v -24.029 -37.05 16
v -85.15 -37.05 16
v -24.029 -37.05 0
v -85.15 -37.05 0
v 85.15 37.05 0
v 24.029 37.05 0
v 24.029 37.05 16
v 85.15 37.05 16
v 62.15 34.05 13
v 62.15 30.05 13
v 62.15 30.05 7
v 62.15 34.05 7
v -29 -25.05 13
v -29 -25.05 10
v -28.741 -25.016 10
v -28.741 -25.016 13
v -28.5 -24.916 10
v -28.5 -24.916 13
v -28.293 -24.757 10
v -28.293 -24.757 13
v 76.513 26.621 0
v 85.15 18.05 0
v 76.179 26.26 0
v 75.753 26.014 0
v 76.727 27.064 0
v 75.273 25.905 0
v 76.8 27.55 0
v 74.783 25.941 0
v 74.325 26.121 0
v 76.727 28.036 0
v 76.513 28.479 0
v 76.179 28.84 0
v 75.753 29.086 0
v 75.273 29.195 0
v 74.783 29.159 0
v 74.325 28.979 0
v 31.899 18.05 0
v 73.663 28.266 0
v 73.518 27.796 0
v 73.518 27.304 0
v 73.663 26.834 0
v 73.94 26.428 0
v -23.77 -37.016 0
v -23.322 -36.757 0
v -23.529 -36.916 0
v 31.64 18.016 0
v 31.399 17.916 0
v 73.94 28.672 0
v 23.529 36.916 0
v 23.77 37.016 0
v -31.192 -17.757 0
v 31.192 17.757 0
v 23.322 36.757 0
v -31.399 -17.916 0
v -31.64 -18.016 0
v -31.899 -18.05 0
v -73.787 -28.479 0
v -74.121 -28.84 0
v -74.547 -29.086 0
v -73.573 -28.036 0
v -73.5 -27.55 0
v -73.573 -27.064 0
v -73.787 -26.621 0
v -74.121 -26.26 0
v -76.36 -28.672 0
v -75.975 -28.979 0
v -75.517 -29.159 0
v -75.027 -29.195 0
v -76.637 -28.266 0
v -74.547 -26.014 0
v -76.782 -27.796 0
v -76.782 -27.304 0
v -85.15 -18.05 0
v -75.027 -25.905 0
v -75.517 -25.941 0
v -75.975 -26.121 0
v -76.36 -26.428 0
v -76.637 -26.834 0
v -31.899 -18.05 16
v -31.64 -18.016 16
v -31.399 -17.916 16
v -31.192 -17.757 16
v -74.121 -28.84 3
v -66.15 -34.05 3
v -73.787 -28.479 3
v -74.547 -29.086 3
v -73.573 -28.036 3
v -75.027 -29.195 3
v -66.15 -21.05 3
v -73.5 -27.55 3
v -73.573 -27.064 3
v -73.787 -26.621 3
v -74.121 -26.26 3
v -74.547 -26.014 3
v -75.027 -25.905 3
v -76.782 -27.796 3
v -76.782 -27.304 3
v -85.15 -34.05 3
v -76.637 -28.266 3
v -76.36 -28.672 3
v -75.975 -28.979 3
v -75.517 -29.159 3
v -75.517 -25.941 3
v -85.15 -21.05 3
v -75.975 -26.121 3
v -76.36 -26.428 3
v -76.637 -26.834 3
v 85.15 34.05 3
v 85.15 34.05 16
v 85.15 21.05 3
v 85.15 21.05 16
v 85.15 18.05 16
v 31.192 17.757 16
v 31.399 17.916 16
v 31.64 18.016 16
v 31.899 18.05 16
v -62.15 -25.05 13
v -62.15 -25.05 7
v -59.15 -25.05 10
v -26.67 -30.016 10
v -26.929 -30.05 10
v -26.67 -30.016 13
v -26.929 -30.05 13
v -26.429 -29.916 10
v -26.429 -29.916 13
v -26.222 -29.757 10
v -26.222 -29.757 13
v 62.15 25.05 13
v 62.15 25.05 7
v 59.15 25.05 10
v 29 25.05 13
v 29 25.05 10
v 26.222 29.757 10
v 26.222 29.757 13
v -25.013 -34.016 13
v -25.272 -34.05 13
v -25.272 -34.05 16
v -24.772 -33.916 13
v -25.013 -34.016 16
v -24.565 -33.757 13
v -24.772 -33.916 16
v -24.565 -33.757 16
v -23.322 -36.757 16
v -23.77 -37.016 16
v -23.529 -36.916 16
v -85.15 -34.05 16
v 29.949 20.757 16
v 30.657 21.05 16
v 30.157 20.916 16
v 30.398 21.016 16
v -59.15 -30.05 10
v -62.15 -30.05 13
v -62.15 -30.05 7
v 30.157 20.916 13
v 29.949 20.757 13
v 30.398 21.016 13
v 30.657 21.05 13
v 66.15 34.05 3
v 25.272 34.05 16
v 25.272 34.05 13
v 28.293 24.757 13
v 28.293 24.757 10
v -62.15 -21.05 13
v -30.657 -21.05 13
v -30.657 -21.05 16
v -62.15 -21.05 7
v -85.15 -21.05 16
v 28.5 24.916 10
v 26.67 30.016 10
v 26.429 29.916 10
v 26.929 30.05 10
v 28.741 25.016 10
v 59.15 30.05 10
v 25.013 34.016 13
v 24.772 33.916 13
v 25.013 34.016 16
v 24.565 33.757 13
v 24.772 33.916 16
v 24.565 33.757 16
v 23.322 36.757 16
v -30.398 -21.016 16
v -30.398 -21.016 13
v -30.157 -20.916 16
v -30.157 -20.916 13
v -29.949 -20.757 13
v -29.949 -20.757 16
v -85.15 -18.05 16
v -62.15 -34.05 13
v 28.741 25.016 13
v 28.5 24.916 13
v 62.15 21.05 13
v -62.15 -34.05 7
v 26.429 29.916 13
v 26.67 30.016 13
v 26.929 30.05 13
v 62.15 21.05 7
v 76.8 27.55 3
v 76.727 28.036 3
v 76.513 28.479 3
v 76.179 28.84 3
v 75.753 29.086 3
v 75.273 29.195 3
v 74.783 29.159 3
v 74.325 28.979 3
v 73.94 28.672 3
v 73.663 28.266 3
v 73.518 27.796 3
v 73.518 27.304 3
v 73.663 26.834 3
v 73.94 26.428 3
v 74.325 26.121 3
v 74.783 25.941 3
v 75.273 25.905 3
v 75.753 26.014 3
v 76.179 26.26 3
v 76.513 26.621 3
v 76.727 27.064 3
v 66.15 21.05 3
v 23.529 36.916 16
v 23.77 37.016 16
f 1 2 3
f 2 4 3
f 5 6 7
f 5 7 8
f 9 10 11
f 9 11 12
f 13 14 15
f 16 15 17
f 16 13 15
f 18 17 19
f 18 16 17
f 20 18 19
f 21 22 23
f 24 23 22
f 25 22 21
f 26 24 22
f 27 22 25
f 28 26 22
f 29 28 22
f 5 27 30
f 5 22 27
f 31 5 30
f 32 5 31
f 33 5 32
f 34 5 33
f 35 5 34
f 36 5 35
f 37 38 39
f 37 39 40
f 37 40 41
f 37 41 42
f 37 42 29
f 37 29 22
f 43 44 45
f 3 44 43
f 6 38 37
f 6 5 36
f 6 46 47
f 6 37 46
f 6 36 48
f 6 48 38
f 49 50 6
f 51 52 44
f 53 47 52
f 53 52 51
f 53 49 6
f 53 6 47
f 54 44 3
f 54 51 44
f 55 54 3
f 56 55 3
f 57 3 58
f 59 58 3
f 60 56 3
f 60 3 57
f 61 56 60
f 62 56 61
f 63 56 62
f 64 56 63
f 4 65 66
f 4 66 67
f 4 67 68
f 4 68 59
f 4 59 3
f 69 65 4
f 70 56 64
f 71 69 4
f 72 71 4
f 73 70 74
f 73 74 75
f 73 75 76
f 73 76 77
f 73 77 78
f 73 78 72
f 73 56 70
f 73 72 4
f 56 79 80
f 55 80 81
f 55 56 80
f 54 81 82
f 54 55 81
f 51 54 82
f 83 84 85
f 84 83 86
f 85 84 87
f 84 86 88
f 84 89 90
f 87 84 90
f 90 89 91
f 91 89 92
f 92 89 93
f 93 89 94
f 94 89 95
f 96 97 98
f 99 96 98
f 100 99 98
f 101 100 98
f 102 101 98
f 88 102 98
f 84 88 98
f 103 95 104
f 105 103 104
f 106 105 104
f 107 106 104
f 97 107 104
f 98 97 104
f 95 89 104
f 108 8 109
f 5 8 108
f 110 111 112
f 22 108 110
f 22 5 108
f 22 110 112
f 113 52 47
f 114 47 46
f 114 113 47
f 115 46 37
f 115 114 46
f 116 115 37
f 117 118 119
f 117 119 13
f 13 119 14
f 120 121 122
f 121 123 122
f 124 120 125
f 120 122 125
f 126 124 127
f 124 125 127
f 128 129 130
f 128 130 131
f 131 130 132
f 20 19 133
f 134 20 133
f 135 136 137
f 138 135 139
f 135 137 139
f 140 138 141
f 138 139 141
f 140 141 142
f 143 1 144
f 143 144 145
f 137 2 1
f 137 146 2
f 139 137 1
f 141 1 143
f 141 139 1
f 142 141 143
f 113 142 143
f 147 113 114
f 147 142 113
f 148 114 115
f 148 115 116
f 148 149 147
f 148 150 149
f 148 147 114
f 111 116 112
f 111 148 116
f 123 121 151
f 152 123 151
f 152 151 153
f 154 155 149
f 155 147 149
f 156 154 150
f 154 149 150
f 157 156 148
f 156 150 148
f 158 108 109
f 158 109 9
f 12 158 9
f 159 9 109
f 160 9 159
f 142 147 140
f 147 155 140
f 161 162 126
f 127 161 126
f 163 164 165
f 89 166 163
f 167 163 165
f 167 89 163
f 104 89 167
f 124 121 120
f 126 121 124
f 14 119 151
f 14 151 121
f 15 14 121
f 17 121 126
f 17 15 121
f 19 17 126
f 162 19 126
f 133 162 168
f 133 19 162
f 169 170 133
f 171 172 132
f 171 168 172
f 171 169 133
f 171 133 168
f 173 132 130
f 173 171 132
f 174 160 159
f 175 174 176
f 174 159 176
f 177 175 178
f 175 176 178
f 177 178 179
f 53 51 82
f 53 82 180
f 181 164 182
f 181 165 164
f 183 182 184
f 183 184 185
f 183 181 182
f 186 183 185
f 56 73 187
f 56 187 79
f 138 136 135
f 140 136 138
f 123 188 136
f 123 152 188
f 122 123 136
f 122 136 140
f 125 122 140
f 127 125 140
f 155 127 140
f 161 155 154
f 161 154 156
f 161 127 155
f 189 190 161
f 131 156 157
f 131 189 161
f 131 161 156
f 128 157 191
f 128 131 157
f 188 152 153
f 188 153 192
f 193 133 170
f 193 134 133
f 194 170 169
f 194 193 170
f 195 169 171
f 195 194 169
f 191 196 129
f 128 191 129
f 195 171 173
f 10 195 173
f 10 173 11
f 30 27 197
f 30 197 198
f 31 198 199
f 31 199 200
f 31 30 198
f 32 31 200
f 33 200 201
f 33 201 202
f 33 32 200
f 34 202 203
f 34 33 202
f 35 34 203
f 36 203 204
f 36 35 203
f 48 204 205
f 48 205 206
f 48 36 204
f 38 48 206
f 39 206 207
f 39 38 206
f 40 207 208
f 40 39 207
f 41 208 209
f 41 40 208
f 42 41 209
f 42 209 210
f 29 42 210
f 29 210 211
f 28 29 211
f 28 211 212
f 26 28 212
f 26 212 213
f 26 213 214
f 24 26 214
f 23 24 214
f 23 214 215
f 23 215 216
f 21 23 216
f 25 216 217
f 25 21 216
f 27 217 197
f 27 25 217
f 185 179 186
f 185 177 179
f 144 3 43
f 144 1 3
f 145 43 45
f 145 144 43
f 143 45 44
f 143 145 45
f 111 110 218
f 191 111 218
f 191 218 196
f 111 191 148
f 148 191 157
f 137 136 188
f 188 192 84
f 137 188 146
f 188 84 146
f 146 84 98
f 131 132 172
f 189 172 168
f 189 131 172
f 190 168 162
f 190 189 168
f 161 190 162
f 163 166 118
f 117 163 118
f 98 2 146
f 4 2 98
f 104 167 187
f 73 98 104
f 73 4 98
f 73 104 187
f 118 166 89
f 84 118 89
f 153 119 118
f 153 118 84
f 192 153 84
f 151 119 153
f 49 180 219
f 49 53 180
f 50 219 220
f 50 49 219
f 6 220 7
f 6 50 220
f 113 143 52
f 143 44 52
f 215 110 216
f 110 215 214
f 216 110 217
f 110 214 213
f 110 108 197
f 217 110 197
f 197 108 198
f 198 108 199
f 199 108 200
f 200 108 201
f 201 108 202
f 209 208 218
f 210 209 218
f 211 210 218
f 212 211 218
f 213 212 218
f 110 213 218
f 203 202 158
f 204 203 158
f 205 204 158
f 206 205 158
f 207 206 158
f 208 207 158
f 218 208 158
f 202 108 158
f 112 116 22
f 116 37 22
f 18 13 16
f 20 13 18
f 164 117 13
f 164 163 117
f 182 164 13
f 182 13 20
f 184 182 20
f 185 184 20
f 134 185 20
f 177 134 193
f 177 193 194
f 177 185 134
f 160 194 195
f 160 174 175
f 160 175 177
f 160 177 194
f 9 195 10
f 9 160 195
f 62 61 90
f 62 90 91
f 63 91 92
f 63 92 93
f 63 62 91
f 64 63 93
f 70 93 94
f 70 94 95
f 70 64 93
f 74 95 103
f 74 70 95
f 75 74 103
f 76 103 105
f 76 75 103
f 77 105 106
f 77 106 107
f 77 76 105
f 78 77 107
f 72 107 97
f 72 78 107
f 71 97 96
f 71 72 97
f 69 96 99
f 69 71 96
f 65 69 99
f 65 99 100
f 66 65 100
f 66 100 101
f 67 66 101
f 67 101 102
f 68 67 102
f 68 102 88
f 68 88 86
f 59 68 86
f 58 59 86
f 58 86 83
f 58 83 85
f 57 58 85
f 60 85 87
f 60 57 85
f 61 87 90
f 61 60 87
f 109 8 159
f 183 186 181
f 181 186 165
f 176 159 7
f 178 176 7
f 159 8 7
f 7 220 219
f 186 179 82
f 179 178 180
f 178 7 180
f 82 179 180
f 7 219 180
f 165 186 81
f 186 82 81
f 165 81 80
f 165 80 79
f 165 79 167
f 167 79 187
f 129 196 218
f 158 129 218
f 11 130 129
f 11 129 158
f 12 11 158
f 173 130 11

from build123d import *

# Parameters (mm, degrees)
SKETCH_10_R     = 1.65
EXTRUDE_1_DEPTH = 3
EXTRUDE_START   = 3
EXTRUDE_2_DEPTH = 7
EXTRUDE_3_DEPTH = 13
CHAMFER_1_SIZE  = 7
EXTRUDE_5_DEPTH = 10
FILLET_1_R      = 1


with BuildPart() as part:
    # 草图10 → 凸台-拉伸1 (new body)
    with BuildSketch(Plane.XY):
        Polygon((-85.15, -18.05), (-31.485028843, -18.05), (23.614971157, 37.05), (85.15, 37.05), (85.15, 18.05), (31.485028843, 18.05), (-23.614971157, -37.05), (-85.15, -37.05), align=None)
        with Locations((-75.15, -27.55)):
            Circle(SKETCH_10_R, mode=Mode.SUBTRACT)
        with Locations((75.15, 27.55)):
            Circle(SKETCH_10_R, mode=Mode.SUBTRACT)
    extrude(amount=EXTRUDE_1_DEPTH)

    # 草图11 → 凸台-拉伸2 (add)
    with BuildSketch(Plane.XY.offset(EXTRUDE_START)):
        Polygon((-66.15, -18.05), (-66.15, -37.05), (-23.614971157, -37.05), (31.485028843, 18.05), (66.15, 18.05), (66.15, 37.05), (23.614971157, 37.05), (-31.485028843, -18.05), align=None)
    extrude(amount=EXTRUDE_2_DEPTH)

    # 草图12 → 凸台-拉伸3 (add)
    with BuildSketch(Plane.XY.offset(EXTRUDE_START)):
        Polygon((-85.15, -18.05), (-31.485028843, -18.05), (23.614971157, 37.05), (85.15, 37.05), (85.15, 34.05), (24.857611845, 34.05), (-30.242388155, -21.05), (-85.15, -21.05), align=None)
        Polygon((-85.15, -34.05), (-85.15, -37.05), (-23.614971157, -37.05), (31.485028843, 18.05), (85.15, 18.05), (85.15, 21.05), (30.242388155, 21.05), (-24.857611845, -34.05), align=None)
    extrude(amount=EXTRUDE_3_DEPTH)

    # 倒角1
    chamfer_1_edges = [part.edges().sort_by_distance(p)[0] for p in [
        (66.15, 27.55, 10),
        (-66.15, -27.55, 10),
    ]]
    chamfer(chamfer_1_edges, length=CHAMFER_1_SIZE - 0.0001)  # a hair under: the kernel refuses the full size

    # 草图15 → 凸台-拉伸5 (add)
    with BuildSketch(Plane.XY.offset(3)):
        Polygon((-62.15, -21.05), (-62.15, -25.05), (-28.585533906, -25.05), (26.514466094, 30.05), (62.15, 30.05), (62.15, 34.05), (24.857611845, 34.05), (-30.242388155, -21.05), align=None)
        Polygon((-62.15, -30.05), (-62.15, -34.05), (-24.857611845, -34.05), (30.242388155, 21.05), (62.15, 21.05), (62.15, 25.05), (28.585533906, 25.05), (-26.514466094, -30.05), align=None)
    extrude(amount=EXTRUDE_5_DEPTH)

    # 圆角1
    fillet_1_edges = [part.edges().sort_by_distance(p)[0] for p in [
        (-31.485028843, -18.05, 8),
        (23.614971157, 37.05, 8),
        (31.485028843, 18.05, 8),
        (-23.614971157, -37.05, 8),
        (-28.585533906, -25.05, 11.5),
        (26.514466094, 30.05, 11.5),
        (-26.514466094, -30.05, 11.5),
        (28.585533906, 25.05, 11.5),
        (24.857611845, 34.05, 14.5),
        (-30.242388155, -21.05, 14.5),
        (-24.857611845, -34.05, 14.5),
        (30.242388155, 21.05, 14.5),
    ]]
    fillet(fillet_1_edges, radius=FILLET_1_R)


solid = part.part
